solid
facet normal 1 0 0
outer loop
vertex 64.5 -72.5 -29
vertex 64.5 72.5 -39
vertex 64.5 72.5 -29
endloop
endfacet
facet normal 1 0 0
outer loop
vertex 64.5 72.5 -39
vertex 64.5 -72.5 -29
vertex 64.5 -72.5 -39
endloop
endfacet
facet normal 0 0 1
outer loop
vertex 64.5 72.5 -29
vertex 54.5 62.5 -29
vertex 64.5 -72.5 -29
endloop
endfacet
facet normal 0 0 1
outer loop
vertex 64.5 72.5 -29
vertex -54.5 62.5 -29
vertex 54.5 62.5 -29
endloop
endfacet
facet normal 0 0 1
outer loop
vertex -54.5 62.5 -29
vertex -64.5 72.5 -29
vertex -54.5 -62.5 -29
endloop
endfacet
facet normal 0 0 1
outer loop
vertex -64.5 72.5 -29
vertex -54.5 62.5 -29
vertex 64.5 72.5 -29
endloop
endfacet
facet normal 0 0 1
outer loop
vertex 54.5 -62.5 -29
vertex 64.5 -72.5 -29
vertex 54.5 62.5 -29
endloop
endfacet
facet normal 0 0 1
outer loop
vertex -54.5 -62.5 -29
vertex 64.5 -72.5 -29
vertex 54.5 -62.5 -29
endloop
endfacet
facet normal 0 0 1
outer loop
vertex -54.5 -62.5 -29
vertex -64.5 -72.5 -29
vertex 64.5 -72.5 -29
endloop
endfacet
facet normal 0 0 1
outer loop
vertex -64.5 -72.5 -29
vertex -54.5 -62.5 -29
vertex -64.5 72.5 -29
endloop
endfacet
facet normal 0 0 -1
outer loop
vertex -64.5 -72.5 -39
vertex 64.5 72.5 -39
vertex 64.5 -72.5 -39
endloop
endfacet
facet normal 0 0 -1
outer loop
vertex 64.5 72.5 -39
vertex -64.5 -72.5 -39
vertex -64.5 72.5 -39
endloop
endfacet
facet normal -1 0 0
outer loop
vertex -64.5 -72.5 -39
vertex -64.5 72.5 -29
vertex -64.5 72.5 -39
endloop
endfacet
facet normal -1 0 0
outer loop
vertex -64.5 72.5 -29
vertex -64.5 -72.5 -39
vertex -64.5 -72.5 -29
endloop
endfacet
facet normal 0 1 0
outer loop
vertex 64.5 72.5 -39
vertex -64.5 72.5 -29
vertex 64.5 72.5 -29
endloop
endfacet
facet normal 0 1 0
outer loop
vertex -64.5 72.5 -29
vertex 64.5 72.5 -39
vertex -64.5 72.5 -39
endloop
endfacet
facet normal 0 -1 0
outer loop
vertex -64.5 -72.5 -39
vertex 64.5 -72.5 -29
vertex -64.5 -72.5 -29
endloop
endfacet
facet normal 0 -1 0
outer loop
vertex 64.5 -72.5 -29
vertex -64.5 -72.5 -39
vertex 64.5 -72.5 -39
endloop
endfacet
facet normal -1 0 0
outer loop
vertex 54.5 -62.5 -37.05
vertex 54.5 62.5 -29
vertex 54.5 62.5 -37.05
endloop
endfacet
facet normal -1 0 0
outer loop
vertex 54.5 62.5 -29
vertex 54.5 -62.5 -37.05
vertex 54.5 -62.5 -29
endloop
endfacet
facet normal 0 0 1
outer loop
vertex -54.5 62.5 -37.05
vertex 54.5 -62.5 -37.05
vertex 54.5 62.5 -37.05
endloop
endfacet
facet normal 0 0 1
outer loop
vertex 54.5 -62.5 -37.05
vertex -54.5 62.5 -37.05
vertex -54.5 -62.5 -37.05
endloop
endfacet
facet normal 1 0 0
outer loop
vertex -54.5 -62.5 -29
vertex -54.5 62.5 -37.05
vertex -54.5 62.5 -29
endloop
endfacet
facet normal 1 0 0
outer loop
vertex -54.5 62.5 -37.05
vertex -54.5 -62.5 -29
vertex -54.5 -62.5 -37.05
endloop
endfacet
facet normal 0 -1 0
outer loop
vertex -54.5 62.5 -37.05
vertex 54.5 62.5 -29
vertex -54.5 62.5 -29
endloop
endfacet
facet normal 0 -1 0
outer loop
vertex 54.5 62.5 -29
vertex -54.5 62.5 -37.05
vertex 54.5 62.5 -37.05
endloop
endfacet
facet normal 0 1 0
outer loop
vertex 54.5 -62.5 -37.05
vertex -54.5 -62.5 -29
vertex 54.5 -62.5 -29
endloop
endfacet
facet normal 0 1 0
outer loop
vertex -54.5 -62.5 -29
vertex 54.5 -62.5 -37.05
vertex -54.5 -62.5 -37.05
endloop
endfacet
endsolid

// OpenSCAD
// file: ../Settings.scad
// Mesurements Of Platform Actual & Global Settings
// Mesurements ACTUAL
PlateWidth = 228;
PlateDepth = 145;
PlateHeight = 5;

ArmWidth = 20;
ArmHeight = 24;
ArmForwardProjection = 25;
ArmRearProjection = 50;
ArmVOffset = 15;

BaseWidth = 129;
BaseHeight = 5;
BaseForwardProjection = 10;
BaseRearProjection = 10;
BaseVOffset = 20;

BaseDeflectorLength = 20;
BaseDeflectorAngle = 45;

ScrewsWidthOutset = 35;
ScrewsDepthOutset = 35;
ScrewsHeadRadius = 10;
ScrewsHeadHeight = 2;
ScrewsHeadProtrusion = 5;
ScrewsShaftRadius = 2;
ScrewsHeadCutoutRadius = 2;

RearPlugWidth = 10;
RearPlugHeight = 5;
RearPlugVOffset = 1;

// Options
// ****************************************************************************************************

d = 0.05;   //Delta

ClipSticksize = 8;
PlateThickness = 5;

TensionerBearingRadius = 2;
TensionerOffsetRadius = 15;
TensionerAngle = 45;
TensionerBearingExtention = 3;
TensionerInset = 2;

//lips to keep the belt in
Lip = 3;
//TopLip = 500;
BottomLip = 5;

MidPlateOverlap = 20;
MidPlateOverlapHeight = 10;
MidPlateOverlapOffset = 7;
ClipHoleSize = 5;

LowerPlateCrossover =10;

RollerCore = 2;
RollerClearance = 2;
RollerLength = PlateDepth - 2*RollerClearance;

UpperRollerProjection  = 40;
UpperRollerRadius = 8;

LowerRollerProjection = 20;
LowerRollerRadius = 6;

RollerBearingCutoutRadius = 3;

IbeamProjection = 15;
IbeamPlateThikness = 6;


// Calculated
// ************************************************************************************************************
PlateX = BaseWidth/2;

RollerLength = PlateDepth - 2*RollerClearance;
PlateArmOverhang = PlateWidth/2 - BaseWidth/2  - ArmWidth; 

UpperRollerPlateX = ArmWidth+PlateArmOverhang+UpperRollerProjection-UpperRollerRadius;
UpperRollerPlateY = -UpperRollerRadius; 

LowerRollerPlateX = ArmWidth+PlateArmOverhang+LowerRollerProjection-LowerRollerRadius;
LowerRollerPlateY = -(ArmVOffset+ArmHeight)+LowerRollerRadius;
// main file
// Roller Project undercarrage

include <../Settings.scad>;

Undercarriage();

module Undercarriage(){
	difference(){
	translate(v=[-BaseWidth/2,-PlateDepth/2,-ArmVOffset -ArmHeight ])
		cube(size=[BaseWidth,PlateDepth ,10]);


	translate(v=[-BaseWidth/2+10,-PlateDepth/2+10,-ArmVOffset -ArmHeight-d+2 ])
		cube(size=[BaseWidth-20,PlateDepth-20 ,10+2*d]);
	}
}
